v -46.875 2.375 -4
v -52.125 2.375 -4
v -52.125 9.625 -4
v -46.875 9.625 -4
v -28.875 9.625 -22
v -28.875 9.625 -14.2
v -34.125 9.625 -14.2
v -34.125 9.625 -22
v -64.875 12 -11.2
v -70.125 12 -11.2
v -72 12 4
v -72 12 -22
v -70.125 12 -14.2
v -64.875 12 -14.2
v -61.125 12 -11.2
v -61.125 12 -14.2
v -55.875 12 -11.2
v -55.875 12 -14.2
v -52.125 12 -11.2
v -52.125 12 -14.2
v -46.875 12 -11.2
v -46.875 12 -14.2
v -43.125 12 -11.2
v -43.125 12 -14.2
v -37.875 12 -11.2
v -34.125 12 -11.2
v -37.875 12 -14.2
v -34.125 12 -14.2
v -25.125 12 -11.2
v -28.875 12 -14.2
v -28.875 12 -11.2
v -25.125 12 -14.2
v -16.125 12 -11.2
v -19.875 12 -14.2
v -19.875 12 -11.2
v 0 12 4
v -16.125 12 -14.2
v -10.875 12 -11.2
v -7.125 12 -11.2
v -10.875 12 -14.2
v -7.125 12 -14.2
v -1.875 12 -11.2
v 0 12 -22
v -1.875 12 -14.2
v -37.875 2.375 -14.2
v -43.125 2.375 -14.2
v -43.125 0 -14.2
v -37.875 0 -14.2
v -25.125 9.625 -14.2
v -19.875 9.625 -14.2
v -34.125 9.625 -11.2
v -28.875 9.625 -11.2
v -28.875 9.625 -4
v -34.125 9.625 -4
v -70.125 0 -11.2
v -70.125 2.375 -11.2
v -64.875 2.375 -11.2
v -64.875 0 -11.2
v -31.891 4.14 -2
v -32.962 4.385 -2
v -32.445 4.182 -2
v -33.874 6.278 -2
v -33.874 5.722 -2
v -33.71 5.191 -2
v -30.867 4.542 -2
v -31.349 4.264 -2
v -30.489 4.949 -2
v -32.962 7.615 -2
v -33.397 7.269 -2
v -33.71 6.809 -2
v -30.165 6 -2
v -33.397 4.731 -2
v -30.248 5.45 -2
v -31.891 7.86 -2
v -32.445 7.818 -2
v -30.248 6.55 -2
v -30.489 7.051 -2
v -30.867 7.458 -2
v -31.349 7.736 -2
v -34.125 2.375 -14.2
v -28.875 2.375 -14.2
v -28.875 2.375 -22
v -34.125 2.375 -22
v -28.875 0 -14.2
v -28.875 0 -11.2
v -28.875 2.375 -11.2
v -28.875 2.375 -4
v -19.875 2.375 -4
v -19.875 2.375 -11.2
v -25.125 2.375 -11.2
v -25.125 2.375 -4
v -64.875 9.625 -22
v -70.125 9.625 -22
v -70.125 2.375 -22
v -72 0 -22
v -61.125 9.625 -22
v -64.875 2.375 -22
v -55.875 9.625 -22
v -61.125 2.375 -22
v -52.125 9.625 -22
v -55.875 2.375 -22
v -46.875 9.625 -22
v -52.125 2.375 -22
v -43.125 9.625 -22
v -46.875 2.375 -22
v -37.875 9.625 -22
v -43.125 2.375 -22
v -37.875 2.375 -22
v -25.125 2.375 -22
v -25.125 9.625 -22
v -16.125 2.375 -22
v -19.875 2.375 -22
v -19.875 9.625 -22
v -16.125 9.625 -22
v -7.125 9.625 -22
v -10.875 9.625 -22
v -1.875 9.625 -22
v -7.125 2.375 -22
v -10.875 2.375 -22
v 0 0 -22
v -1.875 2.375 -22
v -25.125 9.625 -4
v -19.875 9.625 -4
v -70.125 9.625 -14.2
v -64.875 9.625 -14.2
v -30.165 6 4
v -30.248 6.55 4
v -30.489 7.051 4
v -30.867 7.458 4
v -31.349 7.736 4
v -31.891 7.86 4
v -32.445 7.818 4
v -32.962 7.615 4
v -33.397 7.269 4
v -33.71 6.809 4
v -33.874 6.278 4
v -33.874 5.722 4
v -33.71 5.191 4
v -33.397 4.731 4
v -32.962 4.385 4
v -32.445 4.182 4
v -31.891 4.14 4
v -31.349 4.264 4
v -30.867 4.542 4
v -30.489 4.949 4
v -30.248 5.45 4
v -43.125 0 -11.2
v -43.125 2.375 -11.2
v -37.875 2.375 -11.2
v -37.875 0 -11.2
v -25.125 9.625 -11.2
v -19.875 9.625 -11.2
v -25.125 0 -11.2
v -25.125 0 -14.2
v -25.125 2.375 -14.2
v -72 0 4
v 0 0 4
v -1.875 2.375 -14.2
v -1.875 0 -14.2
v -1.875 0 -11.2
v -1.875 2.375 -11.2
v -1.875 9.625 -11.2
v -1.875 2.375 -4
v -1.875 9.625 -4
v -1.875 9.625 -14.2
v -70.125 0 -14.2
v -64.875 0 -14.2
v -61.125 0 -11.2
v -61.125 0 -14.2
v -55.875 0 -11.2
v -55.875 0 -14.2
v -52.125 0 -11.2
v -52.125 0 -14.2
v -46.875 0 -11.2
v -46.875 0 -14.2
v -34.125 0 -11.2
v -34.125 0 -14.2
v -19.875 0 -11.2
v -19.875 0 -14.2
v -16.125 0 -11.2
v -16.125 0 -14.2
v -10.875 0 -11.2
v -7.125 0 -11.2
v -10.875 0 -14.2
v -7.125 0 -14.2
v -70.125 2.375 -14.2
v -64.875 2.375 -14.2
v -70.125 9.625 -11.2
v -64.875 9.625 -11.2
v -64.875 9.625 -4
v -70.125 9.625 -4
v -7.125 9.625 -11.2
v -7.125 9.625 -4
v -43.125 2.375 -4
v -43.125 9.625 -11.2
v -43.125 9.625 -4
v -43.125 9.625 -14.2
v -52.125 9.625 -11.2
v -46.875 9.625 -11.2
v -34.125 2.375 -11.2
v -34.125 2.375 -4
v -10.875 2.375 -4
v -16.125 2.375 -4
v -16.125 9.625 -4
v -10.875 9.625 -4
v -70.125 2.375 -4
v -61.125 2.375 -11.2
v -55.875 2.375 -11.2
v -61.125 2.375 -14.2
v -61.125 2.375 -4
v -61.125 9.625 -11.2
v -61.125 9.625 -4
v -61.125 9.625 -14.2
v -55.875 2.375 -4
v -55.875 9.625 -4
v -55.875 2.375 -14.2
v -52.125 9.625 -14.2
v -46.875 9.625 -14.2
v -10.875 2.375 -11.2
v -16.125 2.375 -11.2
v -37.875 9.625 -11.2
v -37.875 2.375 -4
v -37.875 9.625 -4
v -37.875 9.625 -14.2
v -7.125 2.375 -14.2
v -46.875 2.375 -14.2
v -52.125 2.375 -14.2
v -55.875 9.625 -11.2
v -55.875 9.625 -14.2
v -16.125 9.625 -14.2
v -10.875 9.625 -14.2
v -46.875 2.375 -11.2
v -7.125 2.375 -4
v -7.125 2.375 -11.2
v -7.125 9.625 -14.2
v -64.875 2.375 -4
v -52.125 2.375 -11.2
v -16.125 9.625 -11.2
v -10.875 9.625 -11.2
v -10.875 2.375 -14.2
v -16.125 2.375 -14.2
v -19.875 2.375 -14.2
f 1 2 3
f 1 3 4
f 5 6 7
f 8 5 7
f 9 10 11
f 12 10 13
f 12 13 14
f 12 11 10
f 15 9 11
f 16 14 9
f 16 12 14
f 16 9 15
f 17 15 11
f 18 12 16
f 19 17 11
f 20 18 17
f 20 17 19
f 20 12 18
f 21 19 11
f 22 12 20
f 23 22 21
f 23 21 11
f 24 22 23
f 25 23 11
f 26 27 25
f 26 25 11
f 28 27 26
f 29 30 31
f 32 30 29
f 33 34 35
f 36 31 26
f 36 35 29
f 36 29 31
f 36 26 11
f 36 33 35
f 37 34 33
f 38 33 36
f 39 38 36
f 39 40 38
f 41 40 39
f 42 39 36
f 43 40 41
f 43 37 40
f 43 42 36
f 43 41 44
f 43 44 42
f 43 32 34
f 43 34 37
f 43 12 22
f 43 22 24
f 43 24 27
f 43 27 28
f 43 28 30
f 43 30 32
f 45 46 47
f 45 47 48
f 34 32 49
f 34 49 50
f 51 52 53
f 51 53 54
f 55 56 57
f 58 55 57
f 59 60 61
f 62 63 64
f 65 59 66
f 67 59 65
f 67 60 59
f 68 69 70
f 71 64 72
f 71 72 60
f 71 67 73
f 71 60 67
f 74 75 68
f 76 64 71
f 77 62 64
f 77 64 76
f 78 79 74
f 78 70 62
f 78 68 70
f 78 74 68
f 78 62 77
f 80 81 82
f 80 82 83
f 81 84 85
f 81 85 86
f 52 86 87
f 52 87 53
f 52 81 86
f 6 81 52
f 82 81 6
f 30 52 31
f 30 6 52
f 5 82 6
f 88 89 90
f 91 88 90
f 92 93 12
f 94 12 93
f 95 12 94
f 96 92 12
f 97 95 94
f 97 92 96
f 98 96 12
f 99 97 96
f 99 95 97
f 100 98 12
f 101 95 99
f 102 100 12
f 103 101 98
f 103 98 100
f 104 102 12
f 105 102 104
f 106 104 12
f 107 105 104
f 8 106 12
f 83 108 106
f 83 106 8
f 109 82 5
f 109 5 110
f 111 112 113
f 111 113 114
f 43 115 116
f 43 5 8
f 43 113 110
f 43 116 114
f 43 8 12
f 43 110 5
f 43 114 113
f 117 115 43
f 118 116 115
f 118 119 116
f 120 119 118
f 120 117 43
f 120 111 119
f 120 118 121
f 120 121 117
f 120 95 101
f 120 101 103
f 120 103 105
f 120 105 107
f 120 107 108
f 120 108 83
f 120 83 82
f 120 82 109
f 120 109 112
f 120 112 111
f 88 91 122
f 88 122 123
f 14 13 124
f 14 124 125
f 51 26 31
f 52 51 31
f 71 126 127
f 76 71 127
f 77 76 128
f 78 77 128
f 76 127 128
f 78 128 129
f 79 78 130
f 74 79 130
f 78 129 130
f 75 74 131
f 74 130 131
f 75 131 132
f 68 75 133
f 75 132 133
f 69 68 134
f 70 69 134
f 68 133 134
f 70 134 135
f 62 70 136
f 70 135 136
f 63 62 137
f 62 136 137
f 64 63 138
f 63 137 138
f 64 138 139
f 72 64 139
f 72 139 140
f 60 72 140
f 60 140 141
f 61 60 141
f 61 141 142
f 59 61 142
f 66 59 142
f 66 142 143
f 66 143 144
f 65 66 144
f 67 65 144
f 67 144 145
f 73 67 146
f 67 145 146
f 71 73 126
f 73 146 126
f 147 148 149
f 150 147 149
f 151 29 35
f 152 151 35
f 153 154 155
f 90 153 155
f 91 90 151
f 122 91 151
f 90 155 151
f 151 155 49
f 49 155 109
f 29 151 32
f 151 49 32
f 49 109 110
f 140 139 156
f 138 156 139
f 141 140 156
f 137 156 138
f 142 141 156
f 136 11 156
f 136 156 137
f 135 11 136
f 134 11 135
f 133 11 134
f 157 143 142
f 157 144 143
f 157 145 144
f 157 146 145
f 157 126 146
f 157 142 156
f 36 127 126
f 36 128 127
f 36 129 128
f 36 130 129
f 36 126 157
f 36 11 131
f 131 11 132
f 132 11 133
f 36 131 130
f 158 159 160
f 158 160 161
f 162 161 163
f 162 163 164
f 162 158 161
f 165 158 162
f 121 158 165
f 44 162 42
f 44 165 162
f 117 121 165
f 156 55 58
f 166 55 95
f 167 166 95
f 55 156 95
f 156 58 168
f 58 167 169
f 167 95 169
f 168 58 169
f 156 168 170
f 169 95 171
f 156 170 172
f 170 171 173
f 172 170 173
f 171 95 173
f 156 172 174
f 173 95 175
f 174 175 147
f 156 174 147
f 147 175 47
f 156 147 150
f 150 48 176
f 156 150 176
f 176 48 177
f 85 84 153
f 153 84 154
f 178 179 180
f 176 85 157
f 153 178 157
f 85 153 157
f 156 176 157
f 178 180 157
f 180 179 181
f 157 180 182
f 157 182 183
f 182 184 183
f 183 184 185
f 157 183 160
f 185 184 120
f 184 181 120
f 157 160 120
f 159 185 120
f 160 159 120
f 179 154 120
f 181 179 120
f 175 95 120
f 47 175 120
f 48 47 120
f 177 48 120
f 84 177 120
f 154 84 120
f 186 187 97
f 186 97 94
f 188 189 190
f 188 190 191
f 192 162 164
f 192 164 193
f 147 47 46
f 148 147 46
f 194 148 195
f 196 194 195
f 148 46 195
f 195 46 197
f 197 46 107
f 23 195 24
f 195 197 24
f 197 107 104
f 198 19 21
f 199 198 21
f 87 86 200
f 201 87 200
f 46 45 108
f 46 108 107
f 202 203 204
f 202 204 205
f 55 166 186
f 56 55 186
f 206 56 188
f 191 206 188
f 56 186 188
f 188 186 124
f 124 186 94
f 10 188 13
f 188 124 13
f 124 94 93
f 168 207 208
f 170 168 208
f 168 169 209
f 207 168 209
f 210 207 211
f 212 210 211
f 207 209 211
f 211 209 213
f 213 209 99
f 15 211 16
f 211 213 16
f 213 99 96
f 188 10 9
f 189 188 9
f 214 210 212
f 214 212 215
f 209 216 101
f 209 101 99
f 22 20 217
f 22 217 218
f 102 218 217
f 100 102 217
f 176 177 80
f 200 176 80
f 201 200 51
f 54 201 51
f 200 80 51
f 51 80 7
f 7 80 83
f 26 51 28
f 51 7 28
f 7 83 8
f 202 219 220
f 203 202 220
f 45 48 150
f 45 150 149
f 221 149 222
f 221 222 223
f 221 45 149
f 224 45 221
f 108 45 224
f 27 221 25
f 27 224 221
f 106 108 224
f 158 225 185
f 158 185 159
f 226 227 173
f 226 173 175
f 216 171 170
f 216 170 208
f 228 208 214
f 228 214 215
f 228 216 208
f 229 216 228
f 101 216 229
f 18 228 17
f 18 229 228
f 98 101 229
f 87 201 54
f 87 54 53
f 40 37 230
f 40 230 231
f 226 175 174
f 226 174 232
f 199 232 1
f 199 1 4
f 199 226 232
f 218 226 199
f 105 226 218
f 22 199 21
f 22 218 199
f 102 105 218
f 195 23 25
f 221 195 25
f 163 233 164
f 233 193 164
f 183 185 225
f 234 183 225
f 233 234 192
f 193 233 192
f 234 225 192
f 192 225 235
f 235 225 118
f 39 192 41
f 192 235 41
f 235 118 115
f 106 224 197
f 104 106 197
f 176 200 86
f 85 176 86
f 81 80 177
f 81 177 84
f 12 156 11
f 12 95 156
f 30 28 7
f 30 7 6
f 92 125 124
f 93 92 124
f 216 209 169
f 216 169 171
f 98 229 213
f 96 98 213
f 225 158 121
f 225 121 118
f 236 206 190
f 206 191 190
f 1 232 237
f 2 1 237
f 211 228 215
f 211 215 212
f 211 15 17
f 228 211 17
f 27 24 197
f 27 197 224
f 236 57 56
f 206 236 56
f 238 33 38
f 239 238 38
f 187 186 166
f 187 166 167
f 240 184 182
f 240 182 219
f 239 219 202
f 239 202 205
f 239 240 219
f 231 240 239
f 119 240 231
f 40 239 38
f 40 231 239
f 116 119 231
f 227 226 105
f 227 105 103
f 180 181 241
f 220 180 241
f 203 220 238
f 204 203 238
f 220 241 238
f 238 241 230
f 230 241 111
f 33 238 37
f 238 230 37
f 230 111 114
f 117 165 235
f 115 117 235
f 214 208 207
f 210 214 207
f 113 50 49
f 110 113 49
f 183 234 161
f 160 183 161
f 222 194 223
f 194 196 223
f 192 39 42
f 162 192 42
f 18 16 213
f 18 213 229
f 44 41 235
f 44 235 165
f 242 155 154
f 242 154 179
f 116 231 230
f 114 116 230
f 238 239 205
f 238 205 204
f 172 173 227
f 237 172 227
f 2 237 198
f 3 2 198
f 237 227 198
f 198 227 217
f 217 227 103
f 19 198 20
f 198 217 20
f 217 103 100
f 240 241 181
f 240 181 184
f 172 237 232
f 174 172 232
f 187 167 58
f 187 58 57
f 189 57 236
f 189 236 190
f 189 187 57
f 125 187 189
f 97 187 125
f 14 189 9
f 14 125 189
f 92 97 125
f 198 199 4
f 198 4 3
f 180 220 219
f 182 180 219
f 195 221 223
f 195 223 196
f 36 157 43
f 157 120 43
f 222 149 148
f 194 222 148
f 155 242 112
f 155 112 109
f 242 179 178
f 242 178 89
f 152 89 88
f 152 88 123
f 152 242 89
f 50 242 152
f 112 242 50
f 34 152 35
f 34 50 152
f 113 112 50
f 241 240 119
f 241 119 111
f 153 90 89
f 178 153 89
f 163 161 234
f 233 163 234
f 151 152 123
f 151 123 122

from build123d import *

# Parameters (mm, degrees)
SKETCH1_W           = 72
SKETCH1_H           = 22
BOSS_EXTRUDE1_DEPTH = 12
SKETCH2_W           = 5.25
SKETCH2_H           = 3
CUT_EXTRUDE1_DEPTH  = 77.23647421
LPATTERN2_COUNT     = 8
LPATTERN2_PITCH     = 9
SKETCH3_W           = 5.25
SKETCH3_H           = 7.25
CUT_EXTRUDE2_DEPTH  = 77.23647421
LPATTERN3_COUNT     = 8
LPATTERN3_PITCH     = 9
SKETCH4_W           = 72
SKETCH4_H           = 12
BOSS_EXTRUDE2_DEPTH = 4
SKETCH11_W          = 72
SKETCH11_H          = 12
BOSS_EXTRUDE3_DEPTH = 4
SKETCH12_R          = 1.865
CUT_EXTRUDE9_DEPTH  = 6


with BuildPart() as part:
    # Sketch1 → Boss-Extrude1 (new body)
    with BuildSketch(Plane(origin=(0, 0, 0), x_dir=(1, 0, 0), z_dir=(0, 1, 0))):
        with Locations((-36, 11)):
            Rectangle(SKETCH1_W, SKETCH1_H)
    extrude(amount=BOSS_EXTRUDE1_DEPTH)

    # Sketch2 → Cut-Extrude1 (cut, through all)
    with BuildSketch(Plane(origin=(0, 12, 0), x_dir=(1, 0, 0), z_dir=(0, 1, 0))):
        with Locations((-67.5, 12.7)):
            Rectangle(SKETCH2_W, SKETCH2_H)
    cut_extrude1 = extrude(amount=-CUT_EXTRUDE1_DEPTH, mode=Mode.SUBTRACT)

    # LPattern2: Cut-Extrude1 ×8
    with Locations(*[(i * LPATTERN2_PITCH, 0, 0) for i in range(1, LPATTERN2_COUNT)]):
        add(cut_extrude1, mode=Mode.SUBTRACT)

    # Sketch3 → Cut-Extrude2 (cut, through all)
    with BuildSketch(Plane(origin=(0, 0, -22), x_dir=(-1, 0, 0), z_dir=(0, 0, -1))):
        with Locations((67.5, 6)):
            Rectangle(SKETCH3_W, SKETCH3_H)
    cut_extrude2 = extrude(amount=-CUT_EXTRUDE2_DEPTH, mode=Mode.SUBTRACT)

    # LPattern3: Cut-Extrude2 ×8
    with Locations(*[(i * LPATTERN3_PITCH, 0, 0) for i in range(1, LPATTERN3_COUNT)]):
        add(cut_extrude2, mode=Mode.SUBTRACT)

    # Sketch4 → Boss-Extrude2 (add)
    with BuildSketch(Plane.XY):
        with Locations((-36, 6)):
            Rectangle(SKETCH4_W, SKETCH4_H)
    extrude(amount=-BOSS_EXTRUDE2_DEPTH)

    # Sketch11 → Boss-Extrude3 (add)
    with BuildSketch(Plane.XY):
        with Locations((-36, 6)):
            Rectangle(SKETCH11_W, SKETCH11_H)
    extrude(amount=BOSS_EXTRUDE3_DEPTH)

    # Sketch12 → Cut-Extrude9 (cut)
    with BuildSketch(Plane.XY.offset(4)):
        with Locations((-32.03, 6)):
            Circle(SKETCH12_R)
    extrude(amount=-CUT_EXTRUDE9_DEPTH, mode=Mode.SUBTRACT)


solid = part.part
